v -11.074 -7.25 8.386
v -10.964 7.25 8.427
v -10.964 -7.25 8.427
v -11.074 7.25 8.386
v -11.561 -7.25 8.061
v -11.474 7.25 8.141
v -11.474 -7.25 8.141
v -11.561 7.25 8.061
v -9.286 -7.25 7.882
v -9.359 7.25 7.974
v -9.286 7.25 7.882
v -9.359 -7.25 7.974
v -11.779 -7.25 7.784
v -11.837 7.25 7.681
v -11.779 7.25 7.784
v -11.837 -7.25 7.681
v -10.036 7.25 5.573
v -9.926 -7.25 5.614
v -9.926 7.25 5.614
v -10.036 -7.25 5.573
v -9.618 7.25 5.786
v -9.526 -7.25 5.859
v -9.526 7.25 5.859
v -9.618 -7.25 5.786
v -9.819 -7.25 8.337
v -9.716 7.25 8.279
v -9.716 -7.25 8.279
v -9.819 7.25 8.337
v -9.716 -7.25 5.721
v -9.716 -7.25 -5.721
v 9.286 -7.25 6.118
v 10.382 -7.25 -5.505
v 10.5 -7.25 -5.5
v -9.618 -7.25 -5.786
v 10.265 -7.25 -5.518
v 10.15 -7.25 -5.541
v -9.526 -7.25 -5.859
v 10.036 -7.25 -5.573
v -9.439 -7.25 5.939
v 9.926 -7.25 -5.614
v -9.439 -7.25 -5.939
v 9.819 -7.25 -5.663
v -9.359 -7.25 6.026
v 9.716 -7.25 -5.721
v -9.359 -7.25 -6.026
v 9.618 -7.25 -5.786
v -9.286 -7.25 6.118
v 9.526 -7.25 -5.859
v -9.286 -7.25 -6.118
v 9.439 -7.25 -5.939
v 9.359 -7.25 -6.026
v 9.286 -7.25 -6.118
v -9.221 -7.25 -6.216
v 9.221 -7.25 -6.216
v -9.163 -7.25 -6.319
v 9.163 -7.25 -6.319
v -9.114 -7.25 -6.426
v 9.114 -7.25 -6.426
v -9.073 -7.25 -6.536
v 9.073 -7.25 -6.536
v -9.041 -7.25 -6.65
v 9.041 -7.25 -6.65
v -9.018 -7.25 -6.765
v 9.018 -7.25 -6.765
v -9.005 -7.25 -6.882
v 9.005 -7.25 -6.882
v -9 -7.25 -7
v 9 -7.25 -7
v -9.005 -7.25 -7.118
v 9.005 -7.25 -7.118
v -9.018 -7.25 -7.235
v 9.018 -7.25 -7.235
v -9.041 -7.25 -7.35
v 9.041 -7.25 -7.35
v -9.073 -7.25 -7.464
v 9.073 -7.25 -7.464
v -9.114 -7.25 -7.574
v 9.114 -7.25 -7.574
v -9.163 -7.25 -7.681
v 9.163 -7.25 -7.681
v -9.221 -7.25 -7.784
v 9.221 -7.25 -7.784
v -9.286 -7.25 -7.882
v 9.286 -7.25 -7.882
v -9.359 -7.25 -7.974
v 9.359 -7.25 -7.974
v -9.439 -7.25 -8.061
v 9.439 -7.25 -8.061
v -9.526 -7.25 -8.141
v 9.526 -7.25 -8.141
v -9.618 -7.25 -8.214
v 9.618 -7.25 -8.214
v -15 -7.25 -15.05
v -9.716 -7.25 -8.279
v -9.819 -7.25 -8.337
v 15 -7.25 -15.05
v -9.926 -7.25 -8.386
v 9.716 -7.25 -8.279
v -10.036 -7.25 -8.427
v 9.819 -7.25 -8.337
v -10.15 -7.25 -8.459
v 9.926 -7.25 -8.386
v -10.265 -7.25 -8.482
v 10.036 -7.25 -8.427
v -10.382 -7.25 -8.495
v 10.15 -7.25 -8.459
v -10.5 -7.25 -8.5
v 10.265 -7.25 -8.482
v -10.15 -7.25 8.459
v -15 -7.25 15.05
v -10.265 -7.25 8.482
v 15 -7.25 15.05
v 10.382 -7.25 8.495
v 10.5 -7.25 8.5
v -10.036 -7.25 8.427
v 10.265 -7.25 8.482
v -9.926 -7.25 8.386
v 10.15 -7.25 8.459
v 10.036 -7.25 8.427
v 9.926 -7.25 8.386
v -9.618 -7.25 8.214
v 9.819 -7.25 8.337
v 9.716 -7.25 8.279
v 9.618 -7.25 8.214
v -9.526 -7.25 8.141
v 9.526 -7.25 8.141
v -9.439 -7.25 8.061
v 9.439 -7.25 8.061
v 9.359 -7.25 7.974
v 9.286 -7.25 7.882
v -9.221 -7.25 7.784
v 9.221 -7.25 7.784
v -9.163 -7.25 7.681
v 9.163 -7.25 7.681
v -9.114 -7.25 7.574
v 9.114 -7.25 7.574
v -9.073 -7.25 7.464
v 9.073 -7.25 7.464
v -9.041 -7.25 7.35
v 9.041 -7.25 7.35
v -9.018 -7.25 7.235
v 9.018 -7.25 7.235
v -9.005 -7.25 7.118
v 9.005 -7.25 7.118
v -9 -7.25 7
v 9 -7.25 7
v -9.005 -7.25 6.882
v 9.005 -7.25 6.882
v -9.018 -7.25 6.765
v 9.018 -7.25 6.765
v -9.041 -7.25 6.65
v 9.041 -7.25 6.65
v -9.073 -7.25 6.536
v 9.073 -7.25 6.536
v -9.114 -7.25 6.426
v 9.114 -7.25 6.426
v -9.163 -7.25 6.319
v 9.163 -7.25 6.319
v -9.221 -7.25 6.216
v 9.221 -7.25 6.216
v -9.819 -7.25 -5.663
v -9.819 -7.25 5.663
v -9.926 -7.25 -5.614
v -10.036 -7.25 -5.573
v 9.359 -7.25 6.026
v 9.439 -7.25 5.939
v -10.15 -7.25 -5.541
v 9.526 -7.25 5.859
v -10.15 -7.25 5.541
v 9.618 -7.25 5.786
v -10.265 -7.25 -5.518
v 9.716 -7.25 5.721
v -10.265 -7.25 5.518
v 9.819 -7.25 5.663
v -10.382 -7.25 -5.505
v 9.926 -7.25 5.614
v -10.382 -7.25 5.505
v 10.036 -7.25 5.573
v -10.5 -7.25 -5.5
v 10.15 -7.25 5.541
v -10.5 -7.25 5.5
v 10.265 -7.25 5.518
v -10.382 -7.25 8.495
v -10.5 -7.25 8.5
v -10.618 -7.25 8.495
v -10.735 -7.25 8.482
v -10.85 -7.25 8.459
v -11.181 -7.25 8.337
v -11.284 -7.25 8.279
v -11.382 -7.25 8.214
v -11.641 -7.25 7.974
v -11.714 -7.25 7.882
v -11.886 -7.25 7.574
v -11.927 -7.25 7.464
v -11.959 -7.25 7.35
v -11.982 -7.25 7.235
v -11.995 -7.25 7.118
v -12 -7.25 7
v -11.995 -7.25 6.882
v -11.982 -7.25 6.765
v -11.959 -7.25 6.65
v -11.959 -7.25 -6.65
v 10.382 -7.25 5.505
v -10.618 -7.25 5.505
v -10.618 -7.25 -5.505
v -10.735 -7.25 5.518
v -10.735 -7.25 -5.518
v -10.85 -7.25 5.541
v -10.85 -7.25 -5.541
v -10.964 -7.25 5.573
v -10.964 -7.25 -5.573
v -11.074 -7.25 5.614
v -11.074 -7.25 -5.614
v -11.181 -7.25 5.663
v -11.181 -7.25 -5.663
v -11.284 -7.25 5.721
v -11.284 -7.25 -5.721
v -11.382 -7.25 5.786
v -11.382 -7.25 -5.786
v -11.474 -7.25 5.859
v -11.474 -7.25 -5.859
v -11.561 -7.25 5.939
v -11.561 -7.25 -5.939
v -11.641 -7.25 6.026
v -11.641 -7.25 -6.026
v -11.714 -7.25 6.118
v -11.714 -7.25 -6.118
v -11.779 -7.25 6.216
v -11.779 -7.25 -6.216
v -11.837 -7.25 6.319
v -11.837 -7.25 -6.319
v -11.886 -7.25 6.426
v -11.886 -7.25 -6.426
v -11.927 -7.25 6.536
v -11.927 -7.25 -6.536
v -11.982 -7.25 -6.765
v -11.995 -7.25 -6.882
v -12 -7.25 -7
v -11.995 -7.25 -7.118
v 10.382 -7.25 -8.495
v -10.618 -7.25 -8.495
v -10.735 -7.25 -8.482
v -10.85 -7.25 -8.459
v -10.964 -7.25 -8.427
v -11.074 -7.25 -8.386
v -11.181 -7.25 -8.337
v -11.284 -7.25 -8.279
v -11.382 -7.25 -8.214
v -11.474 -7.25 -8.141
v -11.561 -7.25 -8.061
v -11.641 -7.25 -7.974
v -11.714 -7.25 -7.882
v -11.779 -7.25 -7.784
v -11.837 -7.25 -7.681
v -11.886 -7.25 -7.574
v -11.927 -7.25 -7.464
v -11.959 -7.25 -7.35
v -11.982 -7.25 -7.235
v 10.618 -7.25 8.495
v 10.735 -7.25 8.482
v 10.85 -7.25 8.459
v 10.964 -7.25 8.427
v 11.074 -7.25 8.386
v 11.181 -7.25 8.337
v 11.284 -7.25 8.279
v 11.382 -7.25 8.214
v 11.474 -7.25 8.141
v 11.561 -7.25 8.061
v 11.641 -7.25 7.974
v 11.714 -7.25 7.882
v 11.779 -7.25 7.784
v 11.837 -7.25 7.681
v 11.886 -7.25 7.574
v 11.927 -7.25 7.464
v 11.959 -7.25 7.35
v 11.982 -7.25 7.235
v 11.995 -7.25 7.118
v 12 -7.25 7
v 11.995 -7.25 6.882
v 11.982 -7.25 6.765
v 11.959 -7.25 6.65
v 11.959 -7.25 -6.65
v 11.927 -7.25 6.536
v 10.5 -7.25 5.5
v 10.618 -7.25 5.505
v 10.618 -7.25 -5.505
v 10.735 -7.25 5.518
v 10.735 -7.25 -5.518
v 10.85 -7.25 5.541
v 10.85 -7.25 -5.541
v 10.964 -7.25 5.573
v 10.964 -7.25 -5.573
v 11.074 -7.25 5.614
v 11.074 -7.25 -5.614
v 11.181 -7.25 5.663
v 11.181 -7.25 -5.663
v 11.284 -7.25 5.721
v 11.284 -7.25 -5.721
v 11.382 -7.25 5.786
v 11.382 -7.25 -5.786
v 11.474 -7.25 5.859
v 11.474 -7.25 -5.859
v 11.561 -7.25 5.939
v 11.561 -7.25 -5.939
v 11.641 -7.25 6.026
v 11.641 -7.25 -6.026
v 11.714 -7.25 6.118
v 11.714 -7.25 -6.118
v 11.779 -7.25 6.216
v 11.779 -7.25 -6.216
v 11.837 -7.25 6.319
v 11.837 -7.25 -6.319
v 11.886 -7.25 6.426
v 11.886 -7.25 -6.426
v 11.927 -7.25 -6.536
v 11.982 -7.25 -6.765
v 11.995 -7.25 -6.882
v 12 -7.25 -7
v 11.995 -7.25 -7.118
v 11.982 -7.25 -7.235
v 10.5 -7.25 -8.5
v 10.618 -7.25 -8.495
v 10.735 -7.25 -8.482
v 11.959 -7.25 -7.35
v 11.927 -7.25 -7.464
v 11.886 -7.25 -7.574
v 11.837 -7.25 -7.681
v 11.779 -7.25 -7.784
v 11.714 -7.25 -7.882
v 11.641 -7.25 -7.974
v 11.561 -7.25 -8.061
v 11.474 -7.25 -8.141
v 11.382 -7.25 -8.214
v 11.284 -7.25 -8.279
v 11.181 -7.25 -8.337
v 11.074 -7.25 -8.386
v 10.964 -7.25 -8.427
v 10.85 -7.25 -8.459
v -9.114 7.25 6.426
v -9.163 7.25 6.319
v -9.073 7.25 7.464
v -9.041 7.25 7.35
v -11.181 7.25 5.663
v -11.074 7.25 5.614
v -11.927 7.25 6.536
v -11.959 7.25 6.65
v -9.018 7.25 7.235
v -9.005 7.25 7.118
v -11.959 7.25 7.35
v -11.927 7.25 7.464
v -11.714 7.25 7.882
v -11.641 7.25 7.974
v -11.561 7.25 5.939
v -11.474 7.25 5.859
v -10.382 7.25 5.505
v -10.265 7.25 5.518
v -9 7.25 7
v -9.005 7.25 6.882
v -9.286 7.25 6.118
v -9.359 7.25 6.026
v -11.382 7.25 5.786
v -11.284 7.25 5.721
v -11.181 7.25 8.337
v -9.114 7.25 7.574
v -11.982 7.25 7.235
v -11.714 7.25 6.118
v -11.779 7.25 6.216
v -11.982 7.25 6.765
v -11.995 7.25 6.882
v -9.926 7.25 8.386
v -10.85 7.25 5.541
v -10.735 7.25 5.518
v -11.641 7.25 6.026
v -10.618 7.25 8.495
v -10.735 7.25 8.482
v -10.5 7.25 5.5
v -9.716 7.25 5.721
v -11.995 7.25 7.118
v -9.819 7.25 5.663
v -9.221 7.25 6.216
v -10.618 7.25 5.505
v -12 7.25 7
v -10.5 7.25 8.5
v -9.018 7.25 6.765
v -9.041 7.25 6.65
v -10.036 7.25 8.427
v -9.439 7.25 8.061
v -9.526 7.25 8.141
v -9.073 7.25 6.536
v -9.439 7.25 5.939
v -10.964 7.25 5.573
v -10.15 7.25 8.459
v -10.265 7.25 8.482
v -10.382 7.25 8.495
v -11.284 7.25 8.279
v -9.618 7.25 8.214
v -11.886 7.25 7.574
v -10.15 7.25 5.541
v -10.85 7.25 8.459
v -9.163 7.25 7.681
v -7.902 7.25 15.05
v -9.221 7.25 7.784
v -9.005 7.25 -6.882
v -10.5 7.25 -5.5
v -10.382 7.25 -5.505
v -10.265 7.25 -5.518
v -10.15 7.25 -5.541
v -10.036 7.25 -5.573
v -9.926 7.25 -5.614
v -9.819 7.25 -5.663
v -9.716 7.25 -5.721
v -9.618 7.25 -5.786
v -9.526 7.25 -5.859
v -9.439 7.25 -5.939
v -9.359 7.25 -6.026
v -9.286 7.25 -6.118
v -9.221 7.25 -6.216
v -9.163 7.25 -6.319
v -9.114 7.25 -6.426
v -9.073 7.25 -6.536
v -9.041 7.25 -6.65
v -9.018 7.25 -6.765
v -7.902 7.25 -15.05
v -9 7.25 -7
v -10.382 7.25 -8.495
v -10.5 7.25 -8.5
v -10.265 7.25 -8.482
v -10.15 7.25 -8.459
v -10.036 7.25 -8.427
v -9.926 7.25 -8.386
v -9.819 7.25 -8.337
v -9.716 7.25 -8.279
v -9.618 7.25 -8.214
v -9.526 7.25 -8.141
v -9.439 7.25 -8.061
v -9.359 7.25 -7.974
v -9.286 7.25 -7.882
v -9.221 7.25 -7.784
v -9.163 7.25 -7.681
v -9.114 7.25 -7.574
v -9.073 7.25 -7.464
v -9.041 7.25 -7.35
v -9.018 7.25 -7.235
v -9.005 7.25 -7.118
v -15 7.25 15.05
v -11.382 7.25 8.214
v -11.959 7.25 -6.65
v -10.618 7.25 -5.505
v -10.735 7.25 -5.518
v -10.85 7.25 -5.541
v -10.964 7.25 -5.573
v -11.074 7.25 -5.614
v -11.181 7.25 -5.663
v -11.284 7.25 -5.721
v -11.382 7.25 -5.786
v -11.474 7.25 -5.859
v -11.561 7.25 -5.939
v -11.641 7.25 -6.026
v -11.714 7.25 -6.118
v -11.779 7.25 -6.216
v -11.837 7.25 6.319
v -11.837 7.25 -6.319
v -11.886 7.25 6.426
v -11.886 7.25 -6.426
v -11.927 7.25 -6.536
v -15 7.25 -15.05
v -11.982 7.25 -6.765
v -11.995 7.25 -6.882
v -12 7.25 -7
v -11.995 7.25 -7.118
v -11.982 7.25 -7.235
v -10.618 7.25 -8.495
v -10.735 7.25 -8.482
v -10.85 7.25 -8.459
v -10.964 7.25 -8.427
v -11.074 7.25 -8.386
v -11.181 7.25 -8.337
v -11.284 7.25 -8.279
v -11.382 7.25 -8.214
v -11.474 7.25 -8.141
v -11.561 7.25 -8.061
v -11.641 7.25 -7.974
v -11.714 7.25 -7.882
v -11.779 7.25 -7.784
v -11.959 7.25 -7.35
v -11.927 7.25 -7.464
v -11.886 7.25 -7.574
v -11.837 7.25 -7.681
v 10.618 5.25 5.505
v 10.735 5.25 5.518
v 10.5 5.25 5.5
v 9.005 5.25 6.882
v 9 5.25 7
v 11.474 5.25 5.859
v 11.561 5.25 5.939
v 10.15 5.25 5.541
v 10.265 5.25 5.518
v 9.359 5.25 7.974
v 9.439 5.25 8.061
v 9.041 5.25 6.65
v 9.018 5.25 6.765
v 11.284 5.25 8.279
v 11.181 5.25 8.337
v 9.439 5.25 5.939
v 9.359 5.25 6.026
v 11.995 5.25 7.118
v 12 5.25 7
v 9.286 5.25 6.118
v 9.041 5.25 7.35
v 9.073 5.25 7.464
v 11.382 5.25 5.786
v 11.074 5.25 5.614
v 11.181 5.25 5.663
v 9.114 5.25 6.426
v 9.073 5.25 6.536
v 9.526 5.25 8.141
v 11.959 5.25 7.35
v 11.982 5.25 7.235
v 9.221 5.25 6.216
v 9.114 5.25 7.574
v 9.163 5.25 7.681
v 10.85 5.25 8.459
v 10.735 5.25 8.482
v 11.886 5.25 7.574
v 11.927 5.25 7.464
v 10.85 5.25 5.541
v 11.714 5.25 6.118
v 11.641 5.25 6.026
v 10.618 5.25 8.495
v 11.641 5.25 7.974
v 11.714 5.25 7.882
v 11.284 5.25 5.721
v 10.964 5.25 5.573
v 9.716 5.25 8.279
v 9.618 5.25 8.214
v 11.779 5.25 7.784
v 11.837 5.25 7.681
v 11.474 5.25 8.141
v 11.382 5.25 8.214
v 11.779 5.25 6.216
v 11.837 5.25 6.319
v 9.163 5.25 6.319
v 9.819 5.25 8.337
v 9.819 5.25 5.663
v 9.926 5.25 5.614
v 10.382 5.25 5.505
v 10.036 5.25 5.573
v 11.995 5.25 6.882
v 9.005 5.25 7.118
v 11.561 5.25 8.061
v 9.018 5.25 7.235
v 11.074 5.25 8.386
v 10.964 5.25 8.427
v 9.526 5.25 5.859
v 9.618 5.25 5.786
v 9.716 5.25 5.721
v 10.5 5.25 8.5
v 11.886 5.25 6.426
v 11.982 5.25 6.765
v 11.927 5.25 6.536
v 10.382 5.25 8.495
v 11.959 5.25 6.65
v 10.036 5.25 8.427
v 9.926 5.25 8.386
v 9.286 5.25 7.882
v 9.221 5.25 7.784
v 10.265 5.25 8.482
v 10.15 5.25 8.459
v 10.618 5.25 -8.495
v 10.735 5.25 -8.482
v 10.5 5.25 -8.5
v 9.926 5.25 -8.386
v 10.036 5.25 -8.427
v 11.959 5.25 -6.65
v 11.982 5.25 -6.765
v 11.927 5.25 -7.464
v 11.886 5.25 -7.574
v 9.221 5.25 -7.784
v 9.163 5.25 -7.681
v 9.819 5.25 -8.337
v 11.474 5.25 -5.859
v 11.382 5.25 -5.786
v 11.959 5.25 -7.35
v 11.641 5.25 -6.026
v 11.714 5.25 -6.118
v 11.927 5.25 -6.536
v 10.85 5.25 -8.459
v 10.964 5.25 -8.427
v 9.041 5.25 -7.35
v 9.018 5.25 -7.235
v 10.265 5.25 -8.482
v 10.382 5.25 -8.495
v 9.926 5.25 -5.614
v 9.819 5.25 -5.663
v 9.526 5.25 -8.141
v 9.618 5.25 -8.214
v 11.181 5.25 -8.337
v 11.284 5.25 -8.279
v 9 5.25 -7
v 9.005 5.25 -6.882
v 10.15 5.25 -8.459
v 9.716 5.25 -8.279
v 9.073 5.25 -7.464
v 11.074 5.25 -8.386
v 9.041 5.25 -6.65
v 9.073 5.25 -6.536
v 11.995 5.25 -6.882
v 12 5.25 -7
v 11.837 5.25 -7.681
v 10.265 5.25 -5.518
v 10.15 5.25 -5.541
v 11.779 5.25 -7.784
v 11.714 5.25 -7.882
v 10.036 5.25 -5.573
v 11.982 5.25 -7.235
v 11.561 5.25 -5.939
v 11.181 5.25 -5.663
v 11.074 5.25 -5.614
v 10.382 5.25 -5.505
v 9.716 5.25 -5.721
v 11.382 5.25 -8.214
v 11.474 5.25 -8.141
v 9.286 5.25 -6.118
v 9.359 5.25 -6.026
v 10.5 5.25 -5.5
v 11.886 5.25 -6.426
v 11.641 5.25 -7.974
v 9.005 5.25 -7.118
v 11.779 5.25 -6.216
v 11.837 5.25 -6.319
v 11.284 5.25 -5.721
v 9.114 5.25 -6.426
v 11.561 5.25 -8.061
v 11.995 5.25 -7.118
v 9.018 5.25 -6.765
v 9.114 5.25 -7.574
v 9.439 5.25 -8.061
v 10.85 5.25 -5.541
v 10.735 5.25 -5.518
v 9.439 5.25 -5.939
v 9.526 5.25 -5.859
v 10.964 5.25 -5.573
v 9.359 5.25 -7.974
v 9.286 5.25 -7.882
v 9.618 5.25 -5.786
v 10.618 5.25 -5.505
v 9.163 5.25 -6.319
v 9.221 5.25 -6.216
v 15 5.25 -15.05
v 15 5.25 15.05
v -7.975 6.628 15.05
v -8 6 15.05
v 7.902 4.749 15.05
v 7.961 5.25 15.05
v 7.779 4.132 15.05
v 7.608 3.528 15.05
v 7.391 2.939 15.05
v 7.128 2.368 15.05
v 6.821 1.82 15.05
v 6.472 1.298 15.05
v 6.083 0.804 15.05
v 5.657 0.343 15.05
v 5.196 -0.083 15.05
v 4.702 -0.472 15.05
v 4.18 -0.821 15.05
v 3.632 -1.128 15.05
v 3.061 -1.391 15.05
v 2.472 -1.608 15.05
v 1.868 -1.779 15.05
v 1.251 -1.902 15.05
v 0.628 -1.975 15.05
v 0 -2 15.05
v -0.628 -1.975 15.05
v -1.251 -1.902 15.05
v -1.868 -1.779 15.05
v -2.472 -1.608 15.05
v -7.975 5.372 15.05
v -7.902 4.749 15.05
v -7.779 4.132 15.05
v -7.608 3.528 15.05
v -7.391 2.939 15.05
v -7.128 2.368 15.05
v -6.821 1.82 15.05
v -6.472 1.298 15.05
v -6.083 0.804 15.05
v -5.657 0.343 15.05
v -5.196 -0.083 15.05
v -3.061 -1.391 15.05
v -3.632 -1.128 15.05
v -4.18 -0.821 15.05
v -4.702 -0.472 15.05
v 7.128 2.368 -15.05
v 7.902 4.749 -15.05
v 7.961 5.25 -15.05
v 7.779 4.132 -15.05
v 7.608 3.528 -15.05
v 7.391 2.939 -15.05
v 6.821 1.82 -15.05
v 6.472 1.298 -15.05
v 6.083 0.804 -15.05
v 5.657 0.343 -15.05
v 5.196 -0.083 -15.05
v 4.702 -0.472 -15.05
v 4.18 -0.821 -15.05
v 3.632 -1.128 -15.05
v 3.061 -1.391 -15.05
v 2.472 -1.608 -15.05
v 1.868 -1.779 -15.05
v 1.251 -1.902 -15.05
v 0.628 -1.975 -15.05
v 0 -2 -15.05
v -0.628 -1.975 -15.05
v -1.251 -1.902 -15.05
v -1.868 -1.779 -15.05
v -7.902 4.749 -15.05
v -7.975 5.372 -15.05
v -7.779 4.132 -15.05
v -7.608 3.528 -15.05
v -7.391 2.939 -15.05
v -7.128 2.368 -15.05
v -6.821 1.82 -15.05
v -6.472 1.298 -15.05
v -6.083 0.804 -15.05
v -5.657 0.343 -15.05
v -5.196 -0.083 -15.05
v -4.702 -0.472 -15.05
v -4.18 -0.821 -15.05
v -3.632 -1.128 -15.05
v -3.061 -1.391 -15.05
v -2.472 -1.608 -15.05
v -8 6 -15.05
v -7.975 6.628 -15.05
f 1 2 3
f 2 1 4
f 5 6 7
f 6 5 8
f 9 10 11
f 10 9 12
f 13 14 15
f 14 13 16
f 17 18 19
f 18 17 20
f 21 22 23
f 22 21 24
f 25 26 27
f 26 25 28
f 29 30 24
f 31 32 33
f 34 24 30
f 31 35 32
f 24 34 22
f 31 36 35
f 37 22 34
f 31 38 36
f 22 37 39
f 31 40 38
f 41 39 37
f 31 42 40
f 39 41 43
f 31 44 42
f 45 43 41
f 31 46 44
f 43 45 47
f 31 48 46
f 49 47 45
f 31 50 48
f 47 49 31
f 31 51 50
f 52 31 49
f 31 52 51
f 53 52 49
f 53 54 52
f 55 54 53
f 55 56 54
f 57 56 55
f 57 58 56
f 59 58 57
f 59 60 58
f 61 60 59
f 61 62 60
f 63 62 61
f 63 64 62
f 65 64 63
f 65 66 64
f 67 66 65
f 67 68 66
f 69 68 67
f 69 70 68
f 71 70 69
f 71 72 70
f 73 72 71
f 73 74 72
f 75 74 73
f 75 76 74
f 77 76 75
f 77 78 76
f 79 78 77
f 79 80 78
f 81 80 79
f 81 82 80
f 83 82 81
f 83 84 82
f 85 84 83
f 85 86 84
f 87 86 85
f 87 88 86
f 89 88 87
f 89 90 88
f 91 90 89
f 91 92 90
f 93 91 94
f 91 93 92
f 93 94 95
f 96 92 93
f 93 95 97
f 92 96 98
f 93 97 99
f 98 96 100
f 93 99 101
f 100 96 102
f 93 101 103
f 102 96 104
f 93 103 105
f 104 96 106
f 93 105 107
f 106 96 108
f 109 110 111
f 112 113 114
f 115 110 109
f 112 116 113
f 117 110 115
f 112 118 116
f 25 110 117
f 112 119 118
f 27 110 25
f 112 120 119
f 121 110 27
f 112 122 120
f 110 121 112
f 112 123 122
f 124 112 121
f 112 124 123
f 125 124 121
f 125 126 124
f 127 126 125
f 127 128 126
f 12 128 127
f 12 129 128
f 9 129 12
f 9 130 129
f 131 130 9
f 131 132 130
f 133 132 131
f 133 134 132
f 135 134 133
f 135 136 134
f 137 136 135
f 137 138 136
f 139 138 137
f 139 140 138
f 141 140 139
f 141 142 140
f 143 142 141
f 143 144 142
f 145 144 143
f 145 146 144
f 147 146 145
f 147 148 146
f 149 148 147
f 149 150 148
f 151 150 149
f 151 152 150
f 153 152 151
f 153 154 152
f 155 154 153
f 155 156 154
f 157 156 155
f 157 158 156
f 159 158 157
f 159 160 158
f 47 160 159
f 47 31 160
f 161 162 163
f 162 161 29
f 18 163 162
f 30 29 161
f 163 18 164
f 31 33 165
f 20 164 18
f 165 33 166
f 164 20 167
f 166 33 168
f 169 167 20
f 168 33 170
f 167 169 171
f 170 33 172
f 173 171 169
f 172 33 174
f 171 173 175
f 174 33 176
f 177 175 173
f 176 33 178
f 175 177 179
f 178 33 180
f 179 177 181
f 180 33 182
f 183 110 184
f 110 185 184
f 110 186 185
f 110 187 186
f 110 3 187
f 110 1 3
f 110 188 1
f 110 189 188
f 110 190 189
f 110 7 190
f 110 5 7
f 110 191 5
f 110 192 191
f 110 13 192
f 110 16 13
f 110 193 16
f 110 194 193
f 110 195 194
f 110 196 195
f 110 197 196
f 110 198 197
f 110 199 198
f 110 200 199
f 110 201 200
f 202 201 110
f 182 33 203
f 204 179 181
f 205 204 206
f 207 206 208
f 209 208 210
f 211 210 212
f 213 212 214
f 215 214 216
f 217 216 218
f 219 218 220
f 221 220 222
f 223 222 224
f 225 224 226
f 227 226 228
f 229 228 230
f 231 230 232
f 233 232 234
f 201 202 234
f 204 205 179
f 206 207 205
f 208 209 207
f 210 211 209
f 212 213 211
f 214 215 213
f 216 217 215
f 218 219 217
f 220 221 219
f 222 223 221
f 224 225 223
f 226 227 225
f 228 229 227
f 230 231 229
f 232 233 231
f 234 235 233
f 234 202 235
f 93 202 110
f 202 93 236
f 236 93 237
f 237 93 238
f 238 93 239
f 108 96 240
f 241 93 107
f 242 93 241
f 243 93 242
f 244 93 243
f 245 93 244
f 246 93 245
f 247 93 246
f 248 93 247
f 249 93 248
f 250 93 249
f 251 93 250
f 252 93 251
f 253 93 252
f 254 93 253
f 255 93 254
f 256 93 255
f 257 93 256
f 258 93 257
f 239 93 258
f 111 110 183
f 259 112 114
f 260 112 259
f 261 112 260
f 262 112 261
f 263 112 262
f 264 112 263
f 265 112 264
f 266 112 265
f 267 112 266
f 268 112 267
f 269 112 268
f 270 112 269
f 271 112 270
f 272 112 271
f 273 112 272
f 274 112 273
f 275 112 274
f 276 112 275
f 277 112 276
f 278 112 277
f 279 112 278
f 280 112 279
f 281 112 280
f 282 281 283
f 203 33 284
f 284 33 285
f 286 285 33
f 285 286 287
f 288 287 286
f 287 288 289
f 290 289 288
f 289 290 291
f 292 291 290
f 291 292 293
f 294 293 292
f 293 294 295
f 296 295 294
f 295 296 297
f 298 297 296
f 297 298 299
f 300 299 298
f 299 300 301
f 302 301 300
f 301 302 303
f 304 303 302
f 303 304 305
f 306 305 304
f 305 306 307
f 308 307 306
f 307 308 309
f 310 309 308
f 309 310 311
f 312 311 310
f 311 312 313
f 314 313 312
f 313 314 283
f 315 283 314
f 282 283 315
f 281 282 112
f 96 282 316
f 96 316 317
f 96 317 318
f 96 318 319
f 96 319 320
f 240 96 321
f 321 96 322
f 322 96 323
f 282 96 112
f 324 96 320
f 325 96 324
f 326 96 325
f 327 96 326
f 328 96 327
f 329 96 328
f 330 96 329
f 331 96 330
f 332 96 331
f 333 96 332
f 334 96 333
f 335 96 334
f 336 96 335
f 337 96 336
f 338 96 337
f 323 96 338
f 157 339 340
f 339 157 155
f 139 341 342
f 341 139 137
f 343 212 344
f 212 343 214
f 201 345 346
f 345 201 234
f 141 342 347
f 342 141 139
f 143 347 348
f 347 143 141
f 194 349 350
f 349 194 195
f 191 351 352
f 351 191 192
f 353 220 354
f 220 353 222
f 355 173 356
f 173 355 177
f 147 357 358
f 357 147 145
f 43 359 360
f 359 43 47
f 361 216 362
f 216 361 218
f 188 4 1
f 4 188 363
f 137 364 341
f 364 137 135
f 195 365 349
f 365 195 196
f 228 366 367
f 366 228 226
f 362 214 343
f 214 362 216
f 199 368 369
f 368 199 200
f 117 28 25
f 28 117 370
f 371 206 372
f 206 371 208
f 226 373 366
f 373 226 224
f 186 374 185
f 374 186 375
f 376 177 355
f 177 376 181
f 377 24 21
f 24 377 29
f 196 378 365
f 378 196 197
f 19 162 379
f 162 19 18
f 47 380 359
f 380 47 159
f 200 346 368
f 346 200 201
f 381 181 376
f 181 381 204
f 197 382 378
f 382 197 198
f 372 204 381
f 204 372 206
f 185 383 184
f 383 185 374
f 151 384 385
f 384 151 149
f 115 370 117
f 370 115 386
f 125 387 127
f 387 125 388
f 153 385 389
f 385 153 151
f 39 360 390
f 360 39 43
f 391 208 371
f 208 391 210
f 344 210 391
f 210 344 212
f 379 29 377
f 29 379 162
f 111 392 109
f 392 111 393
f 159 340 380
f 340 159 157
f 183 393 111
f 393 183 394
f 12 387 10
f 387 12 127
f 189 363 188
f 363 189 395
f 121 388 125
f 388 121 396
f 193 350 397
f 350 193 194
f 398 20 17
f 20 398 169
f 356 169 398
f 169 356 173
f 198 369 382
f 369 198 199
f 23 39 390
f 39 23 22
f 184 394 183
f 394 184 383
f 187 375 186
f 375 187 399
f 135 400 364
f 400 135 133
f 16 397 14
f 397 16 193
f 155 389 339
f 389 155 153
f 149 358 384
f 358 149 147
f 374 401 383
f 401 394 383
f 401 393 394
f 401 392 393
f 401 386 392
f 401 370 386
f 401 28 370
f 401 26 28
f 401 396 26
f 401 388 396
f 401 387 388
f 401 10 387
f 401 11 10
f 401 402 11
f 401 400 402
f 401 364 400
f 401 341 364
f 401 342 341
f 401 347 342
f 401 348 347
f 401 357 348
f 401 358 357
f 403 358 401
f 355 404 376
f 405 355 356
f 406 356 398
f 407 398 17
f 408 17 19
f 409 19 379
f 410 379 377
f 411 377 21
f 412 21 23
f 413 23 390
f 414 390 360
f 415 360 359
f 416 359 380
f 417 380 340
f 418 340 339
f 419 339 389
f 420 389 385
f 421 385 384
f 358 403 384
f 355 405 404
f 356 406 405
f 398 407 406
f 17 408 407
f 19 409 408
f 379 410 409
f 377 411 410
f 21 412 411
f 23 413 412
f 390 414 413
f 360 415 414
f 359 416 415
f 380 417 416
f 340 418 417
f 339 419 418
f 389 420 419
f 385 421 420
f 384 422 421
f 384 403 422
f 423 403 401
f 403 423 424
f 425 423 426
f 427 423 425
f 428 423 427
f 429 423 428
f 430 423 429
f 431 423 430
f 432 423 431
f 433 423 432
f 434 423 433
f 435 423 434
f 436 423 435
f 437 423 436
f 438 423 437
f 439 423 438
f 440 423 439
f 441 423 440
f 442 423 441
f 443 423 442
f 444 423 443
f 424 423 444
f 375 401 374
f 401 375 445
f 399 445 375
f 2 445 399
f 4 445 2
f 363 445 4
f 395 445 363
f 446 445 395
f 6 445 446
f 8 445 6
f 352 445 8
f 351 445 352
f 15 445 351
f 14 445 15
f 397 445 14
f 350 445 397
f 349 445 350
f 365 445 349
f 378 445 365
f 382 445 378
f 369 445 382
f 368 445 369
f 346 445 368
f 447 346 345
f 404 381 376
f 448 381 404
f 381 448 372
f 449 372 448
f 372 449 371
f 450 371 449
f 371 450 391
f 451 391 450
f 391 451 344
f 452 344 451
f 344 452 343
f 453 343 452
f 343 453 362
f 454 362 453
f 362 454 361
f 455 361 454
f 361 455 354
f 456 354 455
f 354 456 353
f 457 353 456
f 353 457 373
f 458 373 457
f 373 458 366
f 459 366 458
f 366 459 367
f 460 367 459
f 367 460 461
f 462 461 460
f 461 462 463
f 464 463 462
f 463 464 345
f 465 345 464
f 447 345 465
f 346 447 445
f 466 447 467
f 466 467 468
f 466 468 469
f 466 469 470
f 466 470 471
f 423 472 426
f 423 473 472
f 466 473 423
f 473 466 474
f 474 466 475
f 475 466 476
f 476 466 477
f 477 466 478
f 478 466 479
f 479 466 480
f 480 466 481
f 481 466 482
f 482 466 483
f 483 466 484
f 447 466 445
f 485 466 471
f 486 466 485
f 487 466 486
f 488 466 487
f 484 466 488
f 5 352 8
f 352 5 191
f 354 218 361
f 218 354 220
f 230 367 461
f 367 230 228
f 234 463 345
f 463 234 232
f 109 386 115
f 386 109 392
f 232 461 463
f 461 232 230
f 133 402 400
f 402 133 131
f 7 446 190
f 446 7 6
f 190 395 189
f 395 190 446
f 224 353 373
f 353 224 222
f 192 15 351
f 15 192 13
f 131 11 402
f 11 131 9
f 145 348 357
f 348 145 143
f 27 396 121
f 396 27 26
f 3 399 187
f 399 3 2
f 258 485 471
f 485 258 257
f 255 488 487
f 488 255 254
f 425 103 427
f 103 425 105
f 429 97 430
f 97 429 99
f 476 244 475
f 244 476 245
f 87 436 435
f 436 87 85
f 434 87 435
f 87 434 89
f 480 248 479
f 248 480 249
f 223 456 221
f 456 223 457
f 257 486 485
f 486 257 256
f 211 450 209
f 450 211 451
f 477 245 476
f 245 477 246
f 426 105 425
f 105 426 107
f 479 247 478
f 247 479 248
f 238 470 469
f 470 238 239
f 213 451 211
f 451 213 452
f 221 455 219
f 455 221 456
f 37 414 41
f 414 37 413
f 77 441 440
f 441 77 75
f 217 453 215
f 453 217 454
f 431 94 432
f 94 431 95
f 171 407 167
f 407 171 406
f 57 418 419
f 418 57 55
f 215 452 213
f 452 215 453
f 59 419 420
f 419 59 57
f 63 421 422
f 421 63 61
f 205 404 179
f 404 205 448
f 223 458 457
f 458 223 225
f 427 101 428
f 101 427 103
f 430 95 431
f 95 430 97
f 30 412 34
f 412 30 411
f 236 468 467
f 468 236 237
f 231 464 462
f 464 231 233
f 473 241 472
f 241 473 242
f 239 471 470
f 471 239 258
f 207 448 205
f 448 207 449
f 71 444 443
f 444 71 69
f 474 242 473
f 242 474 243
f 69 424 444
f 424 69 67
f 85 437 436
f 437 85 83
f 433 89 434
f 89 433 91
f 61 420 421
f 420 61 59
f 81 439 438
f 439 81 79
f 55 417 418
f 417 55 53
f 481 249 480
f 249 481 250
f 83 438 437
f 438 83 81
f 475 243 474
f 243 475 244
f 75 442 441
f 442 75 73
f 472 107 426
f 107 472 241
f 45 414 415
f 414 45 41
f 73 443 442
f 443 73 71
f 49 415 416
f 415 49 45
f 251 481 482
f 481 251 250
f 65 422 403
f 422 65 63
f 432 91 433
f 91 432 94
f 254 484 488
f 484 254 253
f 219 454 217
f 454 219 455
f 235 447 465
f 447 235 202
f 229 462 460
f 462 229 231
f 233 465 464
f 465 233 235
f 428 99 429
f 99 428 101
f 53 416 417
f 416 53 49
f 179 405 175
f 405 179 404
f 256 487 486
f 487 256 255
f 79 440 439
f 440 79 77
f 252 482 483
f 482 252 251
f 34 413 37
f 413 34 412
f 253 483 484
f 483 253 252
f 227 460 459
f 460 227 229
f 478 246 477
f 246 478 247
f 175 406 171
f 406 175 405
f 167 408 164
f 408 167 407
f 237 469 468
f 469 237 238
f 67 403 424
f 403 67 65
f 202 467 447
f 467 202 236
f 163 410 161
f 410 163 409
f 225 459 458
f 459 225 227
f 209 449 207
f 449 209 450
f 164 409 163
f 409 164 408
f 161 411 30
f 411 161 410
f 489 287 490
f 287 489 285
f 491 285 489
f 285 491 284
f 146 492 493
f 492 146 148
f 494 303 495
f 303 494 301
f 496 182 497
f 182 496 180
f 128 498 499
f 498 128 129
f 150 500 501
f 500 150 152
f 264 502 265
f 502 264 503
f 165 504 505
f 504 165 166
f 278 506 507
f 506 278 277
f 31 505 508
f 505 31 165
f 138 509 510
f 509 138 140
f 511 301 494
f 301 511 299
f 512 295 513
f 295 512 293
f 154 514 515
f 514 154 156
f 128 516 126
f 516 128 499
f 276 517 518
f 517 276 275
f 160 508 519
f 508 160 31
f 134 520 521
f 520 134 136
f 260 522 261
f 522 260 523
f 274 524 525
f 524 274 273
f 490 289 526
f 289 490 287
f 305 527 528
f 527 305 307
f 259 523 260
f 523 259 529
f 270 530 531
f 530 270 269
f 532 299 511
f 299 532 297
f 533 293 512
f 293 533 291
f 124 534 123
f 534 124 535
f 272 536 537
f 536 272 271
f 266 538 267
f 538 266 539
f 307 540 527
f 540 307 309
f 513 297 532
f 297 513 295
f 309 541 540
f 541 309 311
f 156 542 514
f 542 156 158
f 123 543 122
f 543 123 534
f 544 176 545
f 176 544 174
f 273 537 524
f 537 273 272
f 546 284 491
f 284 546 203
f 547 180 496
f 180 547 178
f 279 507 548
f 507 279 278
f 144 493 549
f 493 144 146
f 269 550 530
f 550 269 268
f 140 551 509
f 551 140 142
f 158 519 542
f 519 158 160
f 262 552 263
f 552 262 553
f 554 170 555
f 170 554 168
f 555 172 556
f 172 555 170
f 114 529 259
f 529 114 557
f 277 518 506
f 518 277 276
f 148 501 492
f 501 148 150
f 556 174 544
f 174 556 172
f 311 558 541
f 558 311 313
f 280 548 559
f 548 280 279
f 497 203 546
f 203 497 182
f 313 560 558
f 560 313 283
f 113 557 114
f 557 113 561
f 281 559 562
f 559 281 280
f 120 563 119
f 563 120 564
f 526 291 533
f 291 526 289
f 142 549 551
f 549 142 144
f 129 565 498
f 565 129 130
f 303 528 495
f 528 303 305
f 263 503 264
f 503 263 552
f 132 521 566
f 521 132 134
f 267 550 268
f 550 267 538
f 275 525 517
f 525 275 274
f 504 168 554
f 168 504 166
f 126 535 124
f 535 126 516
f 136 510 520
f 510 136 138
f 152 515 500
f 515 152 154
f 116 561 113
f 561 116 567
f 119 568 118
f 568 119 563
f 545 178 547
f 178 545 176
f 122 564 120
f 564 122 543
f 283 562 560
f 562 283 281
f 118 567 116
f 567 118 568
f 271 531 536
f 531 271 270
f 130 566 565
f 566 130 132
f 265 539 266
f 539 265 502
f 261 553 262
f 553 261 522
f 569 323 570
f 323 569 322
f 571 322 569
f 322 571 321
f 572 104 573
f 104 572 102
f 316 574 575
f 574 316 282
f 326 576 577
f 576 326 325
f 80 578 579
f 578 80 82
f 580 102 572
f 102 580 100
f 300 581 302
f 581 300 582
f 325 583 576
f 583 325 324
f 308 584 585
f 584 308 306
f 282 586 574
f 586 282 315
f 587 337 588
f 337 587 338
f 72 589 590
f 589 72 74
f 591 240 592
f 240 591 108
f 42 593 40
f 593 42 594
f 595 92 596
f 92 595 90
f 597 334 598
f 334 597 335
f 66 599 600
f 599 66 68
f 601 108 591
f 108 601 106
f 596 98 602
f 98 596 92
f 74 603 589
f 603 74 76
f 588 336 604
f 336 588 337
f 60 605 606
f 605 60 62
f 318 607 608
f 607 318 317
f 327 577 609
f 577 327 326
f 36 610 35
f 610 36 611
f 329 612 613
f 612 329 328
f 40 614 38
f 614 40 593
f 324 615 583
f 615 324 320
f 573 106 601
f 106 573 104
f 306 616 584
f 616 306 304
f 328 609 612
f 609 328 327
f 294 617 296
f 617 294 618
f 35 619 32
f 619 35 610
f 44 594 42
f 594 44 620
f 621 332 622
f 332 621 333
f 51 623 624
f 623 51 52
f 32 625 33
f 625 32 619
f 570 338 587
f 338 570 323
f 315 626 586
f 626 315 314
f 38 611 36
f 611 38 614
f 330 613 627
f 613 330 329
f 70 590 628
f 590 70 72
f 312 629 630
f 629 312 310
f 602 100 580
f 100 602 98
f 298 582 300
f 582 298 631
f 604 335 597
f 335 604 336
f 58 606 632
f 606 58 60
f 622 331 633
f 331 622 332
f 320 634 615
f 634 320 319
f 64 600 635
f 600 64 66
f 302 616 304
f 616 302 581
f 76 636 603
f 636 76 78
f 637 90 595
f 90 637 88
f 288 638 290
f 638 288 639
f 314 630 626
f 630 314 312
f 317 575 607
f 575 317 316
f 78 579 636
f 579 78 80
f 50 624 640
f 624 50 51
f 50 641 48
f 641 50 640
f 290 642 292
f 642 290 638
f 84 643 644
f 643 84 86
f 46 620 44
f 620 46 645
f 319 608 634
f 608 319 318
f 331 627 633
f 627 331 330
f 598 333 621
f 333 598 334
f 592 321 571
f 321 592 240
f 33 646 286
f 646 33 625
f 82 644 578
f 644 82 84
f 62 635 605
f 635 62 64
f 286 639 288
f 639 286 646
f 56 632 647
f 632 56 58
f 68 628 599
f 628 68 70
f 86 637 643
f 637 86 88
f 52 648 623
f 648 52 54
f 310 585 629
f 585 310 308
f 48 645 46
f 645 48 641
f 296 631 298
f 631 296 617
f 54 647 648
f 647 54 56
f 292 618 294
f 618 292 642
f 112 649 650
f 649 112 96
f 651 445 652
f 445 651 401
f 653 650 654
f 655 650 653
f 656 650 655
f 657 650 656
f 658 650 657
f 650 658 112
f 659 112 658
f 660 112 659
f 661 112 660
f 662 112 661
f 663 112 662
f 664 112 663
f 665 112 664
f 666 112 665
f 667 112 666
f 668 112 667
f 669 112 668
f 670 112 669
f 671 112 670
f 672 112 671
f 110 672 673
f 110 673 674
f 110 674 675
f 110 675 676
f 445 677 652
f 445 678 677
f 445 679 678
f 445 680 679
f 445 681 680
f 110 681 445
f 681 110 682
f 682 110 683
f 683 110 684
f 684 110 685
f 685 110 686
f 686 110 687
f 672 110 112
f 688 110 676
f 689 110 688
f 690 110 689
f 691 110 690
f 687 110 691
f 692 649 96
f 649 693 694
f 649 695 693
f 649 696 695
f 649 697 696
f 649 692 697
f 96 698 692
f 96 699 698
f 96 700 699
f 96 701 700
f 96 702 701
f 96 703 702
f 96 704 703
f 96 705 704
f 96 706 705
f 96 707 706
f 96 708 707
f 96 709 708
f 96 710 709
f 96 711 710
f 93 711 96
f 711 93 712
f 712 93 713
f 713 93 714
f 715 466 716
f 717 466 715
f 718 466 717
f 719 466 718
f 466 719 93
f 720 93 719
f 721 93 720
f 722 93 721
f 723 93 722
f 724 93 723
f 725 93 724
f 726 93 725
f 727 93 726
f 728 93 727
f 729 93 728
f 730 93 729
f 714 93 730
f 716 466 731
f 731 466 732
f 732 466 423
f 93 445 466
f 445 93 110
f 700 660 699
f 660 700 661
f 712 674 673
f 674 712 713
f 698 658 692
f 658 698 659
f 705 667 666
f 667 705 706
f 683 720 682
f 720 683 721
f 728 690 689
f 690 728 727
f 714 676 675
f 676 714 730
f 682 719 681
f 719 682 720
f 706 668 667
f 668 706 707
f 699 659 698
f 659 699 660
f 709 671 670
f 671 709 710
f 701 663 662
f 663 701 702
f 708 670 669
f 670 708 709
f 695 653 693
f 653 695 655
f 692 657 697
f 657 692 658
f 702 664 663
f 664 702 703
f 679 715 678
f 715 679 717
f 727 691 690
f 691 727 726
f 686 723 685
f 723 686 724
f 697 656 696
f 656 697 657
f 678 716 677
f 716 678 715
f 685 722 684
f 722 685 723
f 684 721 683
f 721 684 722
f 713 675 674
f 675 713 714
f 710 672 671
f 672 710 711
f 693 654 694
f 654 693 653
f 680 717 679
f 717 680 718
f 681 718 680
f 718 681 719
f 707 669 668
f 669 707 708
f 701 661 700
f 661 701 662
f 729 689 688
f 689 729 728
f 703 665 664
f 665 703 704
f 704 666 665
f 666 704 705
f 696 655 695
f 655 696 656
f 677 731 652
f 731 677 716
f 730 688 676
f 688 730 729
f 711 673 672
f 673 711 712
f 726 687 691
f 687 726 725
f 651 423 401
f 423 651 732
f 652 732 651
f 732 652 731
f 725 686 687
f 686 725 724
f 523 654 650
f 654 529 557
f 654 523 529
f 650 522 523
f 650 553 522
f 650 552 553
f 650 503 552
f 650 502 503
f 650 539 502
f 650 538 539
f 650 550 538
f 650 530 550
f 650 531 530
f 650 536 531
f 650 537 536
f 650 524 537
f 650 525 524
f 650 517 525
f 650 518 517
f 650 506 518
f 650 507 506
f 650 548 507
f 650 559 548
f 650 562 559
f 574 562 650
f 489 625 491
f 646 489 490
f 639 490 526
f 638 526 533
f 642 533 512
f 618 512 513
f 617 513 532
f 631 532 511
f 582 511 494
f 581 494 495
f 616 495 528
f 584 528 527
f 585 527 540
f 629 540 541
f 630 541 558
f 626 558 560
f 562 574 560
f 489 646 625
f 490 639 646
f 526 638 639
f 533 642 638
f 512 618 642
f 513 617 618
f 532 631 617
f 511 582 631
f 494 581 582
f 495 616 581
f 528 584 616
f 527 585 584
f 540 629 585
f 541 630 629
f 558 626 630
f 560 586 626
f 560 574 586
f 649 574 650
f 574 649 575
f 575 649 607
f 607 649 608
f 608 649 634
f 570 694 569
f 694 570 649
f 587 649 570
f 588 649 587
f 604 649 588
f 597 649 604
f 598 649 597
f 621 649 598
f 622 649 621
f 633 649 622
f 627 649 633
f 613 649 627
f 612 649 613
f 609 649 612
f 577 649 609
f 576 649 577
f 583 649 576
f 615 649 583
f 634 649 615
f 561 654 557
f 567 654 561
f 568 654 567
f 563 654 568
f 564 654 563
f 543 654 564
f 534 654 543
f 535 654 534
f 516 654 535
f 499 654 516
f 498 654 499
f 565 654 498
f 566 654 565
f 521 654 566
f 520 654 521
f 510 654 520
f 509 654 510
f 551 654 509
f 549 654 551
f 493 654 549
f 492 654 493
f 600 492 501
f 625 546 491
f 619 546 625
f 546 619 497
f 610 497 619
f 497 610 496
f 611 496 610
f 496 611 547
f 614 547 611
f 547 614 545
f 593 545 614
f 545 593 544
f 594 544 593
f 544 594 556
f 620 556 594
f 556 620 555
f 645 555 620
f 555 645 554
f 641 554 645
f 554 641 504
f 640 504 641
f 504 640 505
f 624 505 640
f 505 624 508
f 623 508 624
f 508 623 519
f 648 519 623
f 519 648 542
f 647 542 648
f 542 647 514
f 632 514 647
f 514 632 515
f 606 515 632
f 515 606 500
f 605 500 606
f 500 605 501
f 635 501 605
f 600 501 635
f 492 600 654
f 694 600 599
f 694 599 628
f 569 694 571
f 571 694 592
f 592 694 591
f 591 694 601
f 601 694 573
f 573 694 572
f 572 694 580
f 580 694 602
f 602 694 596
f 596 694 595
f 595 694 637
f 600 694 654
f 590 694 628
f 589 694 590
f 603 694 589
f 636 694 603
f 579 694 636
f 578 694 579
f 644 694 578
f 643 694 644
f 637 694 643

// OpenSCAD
$fn = 180;
rod_diameter = 16;
length = 30.1;
width = 30;
height = 14.5;
alt_height = -2;
hole_diameter = 3;

difference() {
  cube(size=[width, height, length], center=true);

  // rod
  translate([0, 6, 0])
  cylinder(h=length, d=rod_diameter, $fn=80, center=true);

  // offset heights
  translate([width/2, height+alt_height, 0])
  cube(size=[width, height, length], center=true);

  // holes
  rotate([0, 90, 0])
  union() {
    translate([-7, 0, -10.5])
    rotate([90, 0, 0])
    cylinder(h=height, d=hole_diameter, $fn=80, center=true);

    translate([7, 0, -10.5])
    rotate([90, 0, 0])
    cylinder(h=height, d=hole_diameter, $fn=80, center=true);

    translate([-7, 0, 10.5])
    rotate([90, 0, 0])
    cylinder(h=height, d=hole_diameter, $fn=80, center=true);

    translate([7, 0, 10.5])
    rotate([90, 0, 0])
    cylinder(h=height, d=hole_diameter, $fn=80, center=true);
  }
}
